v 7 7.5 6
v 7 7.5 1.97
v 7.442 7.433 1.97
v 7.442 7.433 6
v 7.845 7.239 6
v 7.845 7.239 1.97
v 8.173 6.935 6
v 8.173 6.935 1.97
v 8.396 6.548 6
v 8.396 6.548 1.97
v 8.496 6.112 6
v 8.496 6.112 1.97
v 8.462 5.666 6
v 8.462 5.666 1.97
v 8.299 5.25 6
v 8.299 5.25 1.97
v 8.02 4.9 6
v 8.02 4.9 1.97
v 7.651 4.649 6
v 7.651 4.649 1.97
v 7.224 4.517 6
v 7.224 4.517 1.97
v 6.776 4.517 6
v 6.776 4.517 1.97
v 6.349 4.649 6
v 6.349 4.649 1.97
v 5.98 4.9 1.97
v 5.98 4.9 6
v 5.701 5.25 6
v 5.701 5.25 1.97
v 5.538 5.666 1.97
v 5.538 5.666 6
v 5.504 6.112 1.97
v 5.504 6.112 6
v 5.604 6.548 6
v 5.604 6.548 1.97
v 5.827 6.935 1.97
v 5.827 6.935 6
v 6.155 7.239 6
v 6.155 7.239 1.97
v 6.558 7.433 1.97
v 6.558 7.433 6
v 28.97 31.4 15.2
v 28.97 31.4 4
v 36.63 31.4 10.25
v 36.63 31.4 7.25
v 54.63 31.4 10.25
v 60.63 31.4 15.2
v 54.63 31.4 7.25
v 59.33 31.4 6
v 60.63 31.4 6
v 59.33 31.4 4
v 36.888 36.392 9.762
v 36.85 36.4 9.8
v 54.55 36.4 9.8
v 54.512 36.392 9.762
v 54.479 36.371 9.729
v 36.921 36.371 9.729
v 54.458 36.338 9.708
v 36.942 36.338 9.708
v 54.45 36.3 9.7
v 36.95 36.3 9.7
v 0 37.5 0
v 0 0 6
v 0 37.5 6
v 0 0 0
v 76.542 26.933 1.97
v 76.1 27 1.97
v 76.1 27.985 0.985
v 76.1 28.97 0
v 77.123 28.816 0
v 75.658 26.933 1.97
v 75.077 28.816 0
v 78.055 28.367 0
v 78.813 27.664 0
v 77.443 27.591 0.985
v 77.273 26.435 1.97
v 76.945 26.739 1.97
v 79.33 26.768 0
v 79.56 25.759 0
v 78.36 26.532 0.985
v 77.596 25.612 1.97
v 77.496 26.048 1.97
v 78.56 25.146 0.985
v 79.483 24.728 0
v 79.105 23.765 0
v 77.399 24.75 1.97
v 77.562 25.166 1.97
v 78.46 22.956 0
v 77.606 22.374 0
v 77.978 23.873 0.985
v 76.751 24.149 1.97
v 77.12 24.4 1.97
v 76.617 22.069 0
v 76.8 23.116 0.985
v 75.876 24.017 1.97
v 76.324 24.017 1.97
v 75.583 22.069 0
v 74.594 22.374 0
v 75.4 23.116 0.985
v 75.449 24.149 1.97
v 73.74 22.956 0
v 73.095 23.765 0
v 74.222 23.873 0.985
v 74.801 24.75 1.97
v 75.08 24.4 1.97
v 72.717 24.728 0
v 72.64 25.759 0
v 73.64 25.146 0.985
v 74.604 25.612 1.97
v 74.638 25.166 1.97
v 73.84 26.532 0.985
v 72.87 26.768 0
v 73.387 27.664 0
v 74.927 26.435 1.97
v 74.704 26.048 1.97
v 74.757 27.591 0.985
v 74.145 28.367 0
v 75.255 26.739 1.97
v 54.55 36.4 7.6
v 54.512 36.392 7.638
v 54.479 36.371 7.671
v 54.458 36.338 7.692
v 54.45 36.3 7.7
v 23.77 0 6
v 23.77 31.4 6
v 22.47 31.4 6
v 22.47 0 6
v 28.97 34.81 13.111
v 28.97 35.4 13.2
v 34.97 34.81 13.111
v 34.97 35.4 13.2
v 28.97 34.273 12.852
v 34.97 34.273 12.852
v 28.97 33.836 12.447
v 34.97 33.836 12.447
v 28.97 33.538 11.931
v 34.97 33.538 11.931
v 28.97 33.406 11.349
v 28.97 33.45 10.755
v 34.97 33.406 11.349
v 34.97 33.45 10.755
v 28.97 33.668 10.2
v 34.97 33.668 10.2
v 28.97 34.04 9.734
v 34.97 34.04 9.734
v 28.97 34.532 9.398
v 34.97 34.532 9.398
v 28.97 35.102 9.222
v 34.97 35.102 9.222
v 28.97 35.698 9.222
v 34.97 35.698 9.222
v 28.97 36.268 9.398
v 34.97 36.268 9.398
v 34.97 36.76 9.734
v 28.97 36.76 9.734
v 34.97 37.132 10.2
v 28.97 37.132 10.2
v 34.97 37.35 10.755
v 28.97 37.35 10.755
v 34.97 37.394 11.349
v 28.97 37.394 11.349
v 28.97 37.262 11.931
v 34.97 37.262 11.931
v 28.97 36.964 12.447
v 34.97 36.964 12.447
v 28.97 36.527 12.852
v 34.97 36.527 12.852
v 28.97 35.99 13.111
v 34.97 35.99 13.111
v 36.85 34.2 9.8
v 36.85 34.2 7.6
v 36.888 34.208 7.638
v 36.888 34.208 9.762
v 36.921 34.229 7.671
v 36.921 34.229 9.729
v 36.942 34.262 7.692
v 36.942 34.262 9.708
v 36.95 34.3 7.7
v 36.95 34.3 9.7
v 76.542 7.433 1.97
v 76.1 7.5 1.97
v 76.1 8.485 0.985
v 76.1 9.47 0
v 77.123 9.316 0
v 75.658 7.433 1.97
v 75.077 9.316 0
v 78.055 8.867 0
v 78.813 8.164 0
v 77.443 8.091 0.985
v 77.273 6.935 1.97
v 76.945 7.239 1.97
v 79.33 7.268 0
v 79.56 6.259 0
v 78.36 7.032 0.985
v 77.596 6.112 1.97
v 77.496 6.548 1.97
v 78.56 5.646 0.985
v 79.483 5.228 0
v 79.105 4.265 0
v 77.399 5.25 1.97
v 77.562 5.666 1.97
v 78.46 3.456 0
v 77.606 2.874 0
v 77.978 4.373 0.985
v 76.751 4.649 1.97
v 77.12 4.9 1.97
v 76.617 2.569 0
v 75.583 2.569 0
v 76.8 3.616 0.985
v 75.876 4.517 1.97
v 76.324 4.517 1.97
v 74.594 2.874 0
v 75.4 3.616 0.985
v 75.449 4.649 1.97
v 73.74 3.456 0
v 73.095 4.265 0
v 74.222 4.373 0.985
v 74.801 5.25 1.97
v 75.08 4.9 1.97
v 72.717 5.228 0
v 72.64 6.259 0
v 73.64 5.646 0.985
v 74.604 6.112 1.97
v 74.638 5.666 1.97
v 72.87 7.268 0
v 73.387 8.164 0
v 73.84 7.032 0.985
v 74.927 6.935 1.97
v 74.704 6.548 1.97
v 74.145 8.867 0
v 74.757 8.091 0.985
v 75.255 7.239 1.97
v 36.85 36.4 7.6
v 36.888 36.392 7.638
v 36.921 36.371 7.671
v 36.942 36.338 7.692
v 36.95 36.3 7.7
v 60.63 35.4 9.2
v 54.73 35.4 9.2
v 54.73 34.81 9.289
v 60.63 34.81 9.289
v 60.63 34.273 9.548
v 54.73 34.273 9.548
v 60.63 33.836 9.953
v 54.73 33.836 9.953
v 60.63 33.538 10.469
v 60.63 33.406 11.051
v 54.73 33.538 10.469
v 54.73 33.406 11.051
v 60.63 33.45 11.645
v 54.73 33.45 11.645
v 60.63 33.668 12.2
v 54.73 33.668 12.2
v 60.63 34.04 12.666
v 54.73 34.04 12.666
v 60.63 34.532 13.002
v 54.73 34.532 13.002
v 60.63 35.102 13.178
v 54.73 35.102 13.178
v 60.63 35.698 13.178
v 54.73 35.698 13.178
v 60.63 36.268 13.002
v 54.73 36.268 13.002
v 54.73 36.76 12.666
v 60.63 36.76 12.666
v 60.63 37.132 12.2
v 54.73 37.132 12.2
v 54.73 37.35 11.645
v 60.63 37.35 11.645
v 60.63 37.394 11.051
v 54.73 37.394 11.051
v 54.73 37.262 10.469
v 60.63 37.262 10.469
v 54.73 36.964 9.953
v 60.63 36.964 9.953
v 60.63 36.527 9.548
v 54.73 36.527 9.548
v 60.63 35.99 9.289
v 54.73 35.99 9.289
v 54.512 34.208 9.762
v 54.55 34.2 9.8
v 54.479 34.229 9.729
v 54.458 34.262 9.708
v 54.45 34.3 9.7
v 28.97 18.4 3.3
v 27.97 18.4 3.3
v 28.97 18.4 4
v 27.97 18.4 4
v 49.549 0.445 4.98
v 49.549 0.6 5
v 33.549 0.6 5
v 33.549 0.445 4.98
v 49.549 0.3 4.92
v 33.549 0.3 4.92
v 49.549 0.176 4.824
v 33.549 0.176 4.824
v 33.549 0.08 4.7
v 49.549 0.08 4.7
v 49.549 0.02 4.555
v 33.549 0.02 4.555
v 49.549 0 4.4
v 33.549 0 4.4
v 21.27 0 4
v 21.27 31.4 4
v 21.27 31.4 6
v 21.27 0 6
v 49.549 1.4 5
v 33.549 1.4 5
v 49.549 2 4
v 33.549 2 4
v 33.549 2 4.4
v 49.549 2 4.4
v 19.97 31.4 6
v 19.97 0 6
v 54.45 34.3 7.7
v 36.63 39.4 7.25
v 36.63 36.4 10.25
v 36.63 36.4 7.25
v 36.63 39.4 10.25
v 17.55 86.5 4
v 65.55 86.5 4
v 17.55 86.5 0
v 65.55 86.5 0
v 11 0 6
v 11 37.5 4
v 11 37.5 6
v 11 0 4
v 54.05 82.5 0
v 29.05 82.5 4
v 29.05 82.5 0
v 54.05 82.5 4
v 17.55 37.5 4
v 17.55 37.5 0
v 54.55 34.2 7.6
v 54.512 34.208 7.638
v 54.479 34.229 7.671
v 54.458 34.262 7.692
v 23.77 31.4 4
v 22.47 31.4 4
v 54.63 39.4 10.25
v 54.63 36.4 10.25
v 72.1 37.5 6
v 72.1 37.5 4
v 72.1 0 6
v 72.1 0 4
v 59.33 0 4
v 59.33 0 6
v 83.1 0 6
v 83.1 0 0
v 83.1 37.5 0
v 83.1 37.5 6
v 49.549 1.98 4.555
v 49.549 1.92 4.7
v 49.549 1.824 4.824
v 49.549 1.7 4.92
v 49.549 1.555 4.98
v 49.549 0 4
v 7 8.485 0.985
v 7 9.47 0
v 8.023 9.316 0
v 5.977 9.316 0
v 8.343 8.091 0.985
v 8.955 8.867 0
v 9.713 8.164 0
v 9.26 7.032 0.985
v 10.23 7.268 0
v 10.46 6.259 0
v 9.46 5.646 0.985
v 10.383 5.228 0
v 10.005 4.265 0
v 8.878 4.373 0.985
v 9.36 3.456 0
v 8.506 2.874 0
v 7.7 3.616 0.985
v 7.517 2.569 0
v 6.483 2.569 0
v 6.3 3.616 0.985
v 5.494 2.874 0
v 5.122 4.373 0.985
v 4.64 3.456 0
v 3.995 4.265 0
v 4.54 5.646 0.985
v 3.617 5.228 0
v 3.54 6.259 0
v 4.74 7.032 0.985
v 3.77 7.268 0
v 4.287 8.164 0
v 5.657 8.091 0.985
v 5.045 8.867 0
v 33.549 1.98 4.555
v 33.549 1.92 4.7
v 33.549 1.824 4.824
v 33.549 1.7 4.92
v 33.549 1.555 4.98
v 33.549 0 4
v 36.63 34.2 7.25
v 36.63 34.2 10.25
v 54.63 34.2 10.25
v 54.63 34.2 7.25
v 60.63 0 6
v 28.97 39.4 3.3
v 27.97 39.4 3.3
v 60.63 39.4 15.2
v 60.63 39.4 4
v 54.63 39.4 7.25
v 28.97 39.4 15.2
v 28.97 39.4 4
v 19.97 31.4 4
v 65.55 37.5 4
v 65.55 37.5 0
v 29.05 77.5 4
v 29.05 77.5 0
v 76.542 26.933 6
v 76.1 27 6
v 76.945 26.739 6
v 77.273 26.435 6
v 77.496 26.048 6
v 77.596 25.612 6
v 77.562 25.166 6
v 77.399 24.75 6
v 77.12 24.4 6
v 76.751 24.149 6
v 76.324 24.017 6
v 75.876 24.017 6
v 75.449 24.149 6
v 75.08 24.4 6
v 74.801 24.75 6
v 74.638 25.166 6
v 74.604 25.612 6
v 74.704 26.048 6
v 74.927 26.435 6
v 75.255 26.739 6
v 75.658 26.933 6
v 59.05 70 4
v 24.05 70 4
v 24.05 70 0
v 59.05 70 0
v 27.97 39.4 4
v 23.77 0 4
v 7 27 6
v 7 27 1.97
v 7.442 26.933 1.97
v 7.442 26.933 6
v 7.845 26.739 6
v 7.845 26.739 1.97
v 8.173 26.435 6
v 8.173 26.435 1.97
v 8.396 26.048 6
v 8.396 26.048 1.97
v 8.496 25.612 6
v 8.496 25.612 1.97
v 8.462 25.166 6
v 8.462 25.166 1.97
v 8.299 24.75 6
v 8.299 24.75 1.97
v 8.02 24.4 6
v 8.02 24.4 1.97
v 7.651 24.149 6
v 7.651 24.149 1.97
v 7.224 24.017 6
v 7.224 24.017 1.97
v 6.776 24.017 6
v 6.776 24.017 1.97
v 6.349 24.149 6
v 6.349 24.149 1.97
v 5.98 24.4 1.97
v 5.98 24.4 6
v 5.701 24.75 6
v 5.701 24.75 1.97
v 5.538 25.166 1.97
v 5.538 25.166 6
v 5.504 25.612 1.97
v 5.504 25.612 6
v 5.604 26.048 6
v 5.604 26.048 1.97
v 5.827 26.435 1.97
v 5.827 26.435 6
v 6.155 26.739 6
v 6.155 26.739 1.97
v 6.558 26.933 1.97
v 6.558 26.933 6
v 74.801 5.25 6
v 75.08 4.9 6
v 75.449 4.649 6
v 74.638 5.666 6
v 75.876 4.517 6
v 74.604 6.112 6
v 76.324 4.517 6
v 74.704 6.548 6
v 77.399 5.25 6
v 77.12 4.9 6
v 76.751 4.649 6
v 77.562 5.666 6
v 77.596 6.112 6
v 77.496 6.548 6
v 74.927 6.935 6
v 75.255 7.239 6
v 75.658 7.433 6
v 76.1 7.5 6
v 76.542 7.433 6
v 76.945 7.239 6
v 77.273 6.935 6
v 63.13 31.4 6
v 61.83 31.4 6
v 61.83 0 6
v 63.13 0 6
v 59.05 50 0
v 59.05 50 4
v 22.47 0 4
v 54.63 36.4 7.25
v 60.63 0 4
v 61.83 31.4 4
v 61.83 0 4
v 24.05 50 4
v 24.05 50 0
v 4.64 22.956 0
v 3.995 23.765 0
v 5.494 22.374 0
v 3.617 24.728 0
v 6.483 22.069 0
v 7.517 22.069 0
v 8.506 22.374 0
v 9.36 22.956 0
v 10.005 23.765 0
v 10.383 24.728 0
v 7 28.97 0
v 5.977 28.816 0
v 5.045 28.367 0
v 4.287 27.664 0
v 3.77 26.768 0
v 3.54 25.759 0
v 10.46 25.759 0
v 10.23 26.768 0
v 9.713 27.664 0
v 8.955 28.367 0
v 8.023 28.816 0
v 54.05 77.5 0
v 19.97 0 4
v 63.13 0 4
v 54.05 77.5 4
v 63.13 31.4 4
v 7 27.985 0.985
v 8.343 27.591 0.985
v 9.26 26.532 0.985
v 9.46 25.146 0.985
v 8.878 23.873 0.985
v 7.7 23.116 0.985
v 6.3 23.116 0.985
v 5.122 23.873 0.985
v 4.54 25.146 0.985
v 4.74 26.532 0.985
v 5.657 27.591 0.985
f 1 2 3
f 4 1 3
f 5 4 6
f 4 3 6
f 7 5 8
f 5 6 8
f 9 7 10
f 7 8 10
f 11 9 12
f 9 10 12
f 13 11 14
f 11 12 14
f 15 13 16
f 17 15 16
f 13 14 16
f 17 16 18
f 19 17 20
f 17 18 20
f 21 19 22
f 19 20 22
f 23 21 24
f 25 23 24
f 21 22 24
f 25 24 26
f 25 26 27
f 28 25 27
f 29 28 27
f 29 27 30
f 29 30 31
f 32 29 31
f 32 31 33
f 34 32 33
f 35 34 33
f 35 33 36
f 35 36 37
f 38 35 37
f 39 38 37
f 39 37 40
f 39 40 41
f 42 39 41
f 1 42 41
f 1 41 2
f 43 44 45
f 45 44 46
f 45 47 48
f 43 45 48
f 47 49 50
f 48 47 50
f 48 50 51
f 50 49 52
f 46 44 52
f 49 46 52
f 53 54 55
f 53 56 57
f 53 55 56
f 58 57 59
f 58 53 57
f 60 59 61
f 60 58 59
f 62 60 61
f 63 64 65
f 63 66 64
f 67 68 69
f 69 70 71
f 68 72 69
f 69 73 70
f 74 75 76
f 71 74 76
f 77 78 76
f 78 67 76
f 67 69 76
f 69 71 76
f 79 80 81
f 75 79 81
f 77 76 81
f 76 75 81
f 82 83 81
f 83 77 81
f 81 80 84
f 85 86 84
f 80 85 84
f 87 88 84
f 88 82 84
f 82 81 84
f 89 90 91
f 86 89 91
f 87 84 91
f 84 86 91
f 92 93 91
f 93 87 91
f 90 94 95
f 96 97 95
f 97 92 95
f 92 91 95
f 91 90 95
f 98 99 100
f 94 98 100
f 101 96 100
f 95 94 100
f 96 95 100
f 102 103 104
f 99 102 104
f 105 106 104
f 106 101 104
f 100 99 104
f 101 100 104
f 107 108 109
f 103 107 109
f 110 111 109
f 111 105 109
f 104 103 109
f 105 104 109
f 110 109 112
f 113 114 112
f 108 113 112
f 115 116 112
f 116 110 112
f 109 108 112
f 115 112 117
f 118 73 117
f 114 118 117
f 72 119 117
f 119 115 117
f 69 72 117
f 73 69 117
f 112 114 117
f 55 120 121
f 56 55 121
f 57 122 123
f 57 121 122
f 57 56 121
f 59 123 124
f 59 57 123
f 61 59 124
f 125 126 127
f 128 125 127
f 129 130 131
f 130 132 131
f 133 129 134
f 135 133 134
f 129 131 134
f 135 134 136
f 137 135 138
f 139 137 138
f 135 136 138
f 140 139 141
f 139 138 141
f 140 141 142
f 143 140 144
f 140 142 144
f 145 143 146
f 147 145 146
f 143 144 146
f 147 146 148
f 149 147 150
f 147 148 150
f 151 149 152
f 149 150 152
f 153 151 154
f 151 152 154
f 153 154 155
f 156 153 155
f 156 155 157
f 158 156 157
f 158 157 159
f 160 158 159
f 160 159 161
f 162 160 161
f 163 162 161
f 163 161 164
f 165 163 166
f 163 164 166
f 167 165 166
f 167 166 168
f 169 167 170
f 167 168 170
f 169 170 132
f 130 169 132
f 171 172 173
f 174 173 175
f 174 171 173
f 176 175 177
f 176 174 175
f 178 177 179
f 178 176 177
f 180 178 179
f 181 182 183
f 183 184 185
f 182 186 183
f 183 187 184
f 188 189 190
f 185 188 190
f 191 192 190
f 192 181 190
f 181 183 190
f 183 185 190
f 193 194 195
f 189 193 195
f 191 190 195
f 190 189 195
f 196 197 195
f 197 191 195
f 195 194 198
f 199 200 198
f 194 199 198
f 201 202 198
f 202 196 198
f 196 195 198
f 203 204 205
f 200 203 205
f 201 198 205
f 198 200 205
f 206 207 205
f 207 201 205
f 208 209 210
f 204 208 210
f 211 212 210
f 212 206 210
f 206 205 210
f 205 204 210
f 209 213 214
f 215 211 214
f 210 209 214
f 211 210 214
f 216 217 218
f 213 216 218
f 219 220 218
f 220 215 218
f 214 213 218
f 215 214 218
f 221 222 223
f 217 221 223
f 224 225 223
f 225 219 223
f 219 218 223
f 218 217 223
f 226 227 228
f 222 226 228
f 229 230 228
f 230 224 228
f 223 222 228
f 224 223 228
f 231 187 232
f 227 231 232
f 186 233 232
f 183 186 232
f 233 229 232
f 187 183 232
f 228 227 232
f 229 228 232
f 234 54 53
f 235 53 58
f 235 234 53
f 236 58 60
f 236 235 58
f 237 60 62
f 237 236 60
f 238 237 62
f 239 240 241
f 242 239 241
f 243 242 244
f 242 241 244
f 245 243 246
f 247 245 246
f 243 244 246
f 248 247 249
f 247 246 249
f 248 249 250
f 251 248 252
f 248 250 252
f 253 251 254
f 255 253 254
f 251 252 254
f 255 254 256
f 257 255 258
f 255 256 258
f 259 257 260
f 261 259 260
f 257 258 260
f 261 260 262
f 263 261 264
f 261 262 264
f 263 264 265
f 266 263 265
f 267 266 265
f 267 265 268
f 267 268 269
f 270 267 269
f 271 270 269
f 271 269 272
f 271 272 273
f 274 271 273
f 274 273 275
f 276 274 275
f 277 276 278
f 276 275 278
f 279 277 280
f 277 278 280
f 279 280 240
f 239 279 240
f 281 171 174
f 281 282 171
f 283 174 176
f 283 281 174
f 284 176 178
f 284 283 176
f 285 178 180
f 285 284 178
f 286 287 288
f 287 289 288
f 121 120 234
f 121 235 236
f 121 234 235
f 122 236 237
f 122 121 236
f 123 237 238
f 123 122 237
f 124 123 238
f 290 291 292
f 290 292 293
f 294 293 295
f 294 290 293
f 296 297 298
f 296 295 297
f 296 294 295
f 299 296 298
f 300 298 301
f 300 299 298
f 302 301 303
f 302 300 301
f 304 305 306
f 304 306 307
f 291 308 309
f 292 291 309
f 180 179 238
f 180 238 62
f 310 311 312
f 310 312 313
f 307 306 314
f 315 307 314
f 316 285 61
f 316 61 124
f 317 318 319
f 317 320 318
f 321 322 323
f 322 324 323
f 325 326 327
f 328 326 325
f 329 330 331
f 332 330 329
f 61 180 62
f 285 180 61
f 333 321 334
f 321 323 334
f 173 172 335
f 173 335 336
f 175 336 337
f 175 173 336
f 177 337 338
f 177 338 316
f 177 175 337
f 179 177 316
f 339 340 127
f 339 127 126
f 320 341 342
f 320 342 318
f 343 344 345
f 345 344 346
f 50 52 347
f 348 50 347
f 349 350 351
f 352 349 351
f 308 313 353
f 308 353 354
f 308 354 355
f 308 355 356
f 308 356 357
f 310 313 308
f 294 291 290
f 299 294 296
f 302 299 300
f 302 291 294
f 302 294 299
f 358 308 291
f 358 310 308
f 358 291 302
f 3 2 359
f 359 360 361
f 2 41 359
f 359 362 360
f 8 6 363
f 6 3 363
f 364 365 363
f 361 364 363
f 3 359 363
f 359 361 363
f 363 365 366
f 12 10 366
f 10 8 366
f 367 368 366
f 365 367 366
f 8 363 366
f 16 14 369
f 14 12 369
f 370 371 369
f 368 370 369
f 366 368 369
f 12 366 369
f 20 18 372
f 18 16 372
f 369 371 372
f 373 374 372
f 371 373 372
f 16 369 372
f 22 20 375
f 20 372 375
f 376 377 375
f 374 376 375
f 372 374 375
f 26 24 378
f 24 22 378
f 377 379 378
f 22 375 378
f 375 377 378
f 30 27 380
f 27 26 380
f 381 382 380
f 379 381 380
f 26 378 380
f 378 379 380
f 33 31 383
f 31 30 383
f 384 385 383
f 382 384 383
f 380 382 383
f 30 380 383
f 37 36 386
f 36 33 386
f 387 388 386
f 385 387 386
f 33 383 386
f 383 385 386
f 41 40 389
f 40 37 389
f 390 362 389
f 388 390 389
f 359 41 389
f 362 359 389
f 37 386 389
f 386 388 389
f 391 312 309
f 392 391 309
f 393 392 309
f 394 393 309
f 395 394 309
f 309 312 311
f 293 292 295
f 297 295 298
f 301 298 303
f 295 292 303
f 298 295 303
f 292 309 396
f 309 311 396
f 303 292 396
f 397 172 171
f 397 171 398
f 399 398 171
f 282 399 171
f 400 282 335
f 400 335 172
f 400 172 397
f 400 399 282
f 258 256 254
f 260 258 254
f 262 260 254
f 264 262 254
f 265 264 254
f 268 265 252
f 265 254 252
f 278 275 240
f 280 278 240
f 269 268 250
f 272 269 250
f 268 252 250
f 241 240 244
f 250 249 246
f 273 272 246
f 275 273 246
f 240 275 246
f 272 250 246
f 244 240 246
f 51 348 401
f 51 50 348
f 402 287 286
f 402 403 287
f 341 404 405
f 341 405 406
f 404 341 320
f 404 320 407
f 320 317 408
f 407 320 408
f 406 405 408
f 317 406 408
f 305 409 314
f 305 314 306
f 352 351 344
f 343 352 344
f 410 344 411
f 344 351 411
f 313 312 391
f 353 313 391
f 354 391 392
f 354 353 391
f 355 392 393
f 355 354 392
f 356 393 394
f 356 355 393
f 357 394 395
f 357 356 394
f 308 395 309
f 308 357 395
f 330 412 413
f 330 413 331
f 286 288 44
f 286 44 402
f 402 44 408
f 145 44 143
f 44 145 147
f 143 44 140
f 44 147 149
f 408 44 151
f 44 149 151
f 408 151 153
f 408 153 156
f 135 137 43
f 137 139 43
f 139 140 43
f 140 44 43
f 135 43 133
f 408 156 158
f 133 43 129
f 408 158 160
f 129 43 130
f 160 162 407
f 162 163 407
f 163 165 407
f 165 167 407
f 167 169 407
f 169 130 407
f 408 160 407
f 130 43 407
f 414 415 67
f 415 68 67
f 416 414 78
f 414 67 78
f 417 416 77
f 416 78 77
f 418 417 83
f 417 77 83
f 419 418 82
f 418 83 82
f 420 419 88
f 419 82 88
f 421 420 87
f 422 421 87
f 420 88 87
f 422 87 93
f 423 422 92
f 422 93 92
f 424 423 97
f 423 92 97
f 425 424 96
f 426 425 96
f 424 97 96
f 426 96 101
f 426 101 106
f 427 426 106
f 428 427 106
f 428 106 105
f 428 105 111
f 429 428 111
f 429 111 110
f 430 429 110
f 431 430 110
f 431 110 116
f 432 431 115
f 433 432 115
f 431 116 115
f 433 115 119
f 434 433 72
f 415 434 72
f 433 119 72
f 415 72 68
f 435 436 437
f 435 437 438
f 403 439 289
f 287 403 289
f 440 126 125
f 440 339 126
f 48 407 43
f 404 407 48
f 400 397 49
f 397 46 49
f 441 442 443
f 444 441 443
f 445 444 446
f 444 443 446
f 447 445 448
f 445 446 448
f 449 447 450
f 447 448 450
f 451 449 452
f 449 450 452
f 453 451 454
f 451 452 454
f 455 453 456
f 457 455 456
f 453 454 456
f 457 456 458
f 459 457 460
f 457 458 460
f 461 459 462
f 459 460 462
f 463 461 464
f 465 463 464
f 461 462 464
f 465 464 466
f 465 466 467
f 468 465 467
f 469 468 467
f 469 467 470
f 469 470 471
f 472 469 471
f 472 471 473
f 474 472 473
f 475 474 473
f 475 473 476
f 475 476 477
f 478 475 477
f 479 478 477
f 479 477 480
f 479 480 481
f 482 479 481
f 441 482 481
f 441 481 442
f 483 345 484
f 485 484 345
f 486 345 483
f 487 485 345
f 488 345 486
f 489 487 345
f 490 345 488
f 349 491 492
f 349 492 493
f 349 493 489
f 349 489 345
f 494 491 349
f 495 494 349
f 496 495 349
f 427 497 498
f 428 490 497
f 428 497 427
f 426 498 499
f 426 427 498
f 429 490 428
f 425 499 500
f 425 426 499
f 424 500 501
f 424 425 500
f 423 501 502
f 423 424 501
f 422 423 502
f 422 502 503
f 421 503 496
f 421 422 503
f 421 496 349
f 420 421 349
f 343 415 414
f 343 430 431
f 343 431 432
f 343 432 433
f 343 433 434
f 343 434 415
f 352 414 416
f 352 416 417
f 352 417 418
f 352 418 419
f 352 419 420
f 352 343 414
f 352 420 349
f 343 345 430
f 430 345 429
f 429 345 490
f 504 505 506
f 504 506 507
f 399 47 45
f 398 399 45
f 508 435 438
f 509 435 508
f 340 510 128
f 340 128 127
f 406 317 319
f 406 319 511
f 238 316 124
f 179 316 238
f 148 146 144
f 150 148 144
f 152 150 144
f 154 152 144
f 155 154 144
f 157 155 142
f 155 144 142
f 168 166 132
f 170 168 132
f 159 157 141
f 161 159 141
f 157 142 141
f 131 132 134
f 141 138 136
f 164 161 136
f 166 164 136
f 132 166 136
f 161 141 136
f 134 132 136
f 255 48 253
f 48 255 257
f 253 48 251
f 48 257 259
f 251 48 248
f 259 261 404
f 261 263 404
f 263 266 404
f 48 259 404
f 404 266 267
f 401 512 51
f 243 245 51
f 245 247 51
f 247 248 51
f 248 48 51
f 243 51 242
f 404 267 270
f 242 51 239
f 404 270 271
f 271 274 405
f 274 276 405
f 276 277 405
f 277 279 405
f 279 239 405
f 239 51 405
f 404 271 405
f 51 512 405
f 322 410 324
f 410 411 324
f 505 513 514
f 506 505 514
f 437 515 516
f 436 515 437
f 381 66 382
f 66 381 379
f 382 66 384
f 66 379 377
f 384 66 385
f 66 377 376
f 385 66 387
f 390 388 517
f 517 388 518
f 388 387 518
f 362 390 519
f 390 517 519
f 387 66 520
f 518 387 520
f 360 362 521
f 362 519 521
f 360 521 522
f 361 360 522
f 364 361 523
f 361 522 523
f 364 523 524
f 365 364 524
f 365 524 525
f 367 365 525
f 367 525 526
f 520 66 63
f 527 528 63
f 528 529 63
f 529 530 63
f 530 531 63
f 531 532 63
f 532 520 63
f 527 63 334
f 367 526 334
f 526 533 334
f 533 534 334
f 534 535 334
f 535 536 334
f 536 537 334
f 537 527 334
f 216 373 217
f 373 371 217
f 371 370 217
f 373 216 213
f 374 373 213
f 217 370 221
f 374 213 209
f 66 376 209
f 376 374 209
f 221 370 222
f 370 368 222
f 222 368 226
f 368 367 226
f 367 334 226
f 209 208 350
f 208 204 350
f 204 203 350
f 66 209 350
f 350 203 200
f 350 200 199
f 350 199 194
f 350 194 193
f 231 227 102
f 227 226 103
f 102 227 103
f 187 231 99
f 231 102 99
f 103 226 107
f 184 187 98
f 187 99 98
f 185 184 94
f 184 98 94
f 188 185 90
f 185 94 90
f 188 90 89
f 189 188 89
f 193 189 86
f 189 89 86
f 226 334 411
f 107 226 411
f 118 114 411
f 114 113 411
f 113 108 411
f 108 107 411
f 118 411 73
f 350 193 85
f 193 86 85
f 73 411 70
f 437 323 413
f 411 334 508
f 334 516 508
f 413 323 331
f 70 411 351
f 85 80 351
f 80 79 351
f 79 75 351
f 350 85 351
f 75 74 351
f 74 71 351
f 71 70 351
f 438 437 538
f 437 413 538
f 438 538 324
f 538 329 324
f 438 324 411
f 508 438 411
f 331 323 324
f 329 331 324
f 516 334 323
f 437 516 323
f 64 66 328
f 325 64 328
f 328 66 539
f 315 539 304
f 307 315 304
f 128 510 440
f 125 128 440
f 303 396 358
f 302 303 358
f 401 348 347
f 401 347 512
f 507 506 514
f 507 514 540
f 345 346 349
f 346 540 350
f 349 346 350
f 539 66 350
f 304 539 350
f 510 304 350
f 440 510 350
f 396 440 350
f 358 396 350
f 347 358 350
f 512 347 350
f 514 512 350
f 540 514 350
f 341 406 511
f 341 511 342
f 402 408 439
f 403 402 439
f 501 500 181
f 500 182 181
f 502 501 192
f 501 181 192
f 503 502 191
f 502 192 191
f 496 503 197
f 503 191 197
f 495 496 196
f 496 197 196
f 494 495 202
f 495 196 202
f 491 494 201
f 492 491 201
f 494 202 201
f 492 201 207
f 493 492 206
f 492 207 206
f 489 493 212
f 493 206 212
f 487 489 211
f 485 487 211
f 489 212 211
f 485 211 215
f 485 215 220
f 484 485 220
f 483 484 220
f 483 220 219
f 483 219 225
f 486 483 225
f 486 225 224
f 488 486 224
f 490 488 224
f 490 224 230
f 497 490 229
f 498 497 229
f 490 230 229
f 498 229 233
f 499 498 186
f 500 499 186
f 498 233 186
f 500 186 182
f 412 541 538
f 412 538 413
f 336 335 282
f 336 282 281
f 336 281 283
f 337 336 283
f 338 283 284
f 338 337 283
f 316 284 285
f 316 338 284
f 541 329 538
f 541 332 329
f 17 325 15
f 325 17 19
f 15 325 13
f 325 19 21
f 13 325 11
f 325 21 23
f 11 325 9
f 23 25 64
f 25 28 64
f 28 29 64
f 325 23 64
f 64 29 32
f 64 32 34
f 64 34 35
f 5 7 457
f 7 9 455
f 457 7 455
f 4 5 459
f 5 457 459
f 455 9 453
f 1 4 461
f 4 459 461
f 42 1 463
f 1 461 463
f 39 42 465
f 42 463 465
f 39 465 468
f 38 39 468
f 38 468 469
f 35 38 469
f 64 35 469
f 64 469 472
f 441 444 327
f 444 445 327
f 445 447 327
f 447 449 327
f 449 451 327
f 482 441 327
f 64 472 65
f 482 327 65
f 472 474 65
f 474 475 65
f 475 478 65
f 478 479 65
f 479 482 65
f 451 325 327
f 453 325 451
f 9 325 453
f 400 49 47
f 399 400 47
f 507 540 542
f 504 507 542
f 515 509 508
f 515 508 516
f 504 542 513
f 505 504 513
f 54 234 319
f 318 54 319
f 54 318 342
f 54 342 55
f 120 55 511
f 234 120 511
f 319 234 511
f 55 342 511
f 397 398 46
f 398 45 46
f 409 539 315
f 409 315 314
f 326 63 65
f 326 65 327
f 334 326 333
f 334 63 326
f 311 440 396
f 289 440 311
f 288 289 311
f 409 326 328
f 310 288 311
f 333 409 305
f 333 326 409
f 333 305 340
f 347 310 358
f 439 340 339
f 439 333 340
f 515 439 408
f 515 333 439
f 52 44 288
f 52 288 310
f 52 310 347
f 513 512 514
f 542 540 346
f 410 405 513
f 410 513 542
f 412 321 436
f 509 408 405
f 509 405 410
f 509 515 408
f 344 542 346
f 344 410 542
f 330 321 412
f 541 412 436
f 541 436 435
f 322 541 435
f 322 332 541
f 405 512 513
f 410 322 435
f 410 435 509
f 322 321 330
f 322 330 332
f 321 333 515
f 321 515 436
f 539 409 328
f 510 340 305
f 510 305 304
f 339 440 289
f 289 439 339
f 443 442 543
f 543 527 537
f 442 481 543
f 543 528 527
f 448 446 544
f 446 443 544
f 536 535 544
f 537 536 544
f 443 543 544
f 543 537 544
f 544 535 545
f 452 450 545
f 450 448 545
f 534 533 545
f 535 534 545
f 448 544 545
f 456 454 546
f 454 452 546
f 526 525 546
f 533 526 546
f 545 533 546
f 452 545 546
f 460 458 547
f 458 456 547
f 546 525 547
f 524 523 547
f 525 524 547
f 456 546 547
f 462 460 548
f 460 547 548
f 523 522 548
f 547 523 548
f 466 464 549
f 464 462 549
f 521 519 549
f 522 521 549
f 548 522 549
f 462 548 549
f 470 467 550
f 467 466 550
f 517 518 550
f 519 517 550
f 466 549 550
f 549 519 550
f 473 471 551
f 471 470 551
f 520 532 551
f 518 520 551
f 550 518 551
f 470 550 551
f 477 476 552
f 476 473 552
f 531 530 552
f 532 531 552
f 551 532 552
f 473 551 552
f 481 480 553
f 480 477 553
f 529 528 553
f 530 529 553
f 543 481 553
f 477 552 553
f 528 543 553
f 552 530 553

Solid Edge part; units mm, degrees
sketch "Sketch1" plane through (0, 0, 0) normal (0, 0, 1) x (1, 0, 0)
  line L0 (83.1, 37.5) -> (65.55, 37.5)
  line L1 (65.55, 37.5) -> (65.55, 86.5)
  line L2 (65.55, 86.5) -> (17.55, 86.5)
  line L3 (17.55, 86.5) -> (17.55, 37.5)
  line L4 (0, 37.5) -> (17.55, 37.5)
  line L5 (0, 0) -> (0, 37.5)
  line L6 (0, 0) -> (83.1, 0)
  line L7 (83.1, 0) -> (83.1, 37.5)
extrude "Protrusion1" add sketch "Sketch1" along normal blind 4
sketch "Sketch2" plane through (40.5, 43.25, 4) normal (0, 0, 1) x (1, 0, 0)
  line L0 (-29.5, -5.75) -> (-29.5, -43.25)
  line L1 (-29.5, -43.25) -> (-40.5, -43.25)
  line L2 (-40.5, -43.25) -> (-40.5, -5.75)
  line L3 (-40.5, -5.75) -> (-29.5, -5.75)
  line L4 (-20.53, -43.25) -> (-20.53, -11.85)
  line L5 (-20.53, -11.85) -> (-19.23, -11.85)
  line L6 (-19.23, -11.85) -> (-19.23, -43.25)
  line L7 (-19.23, -43.25) -> (-20.53, -43.25)
  line L8 (-16.73, -11.85) -> (-16.73, -43.25)
  line L9 (-16.73, -43.25) -> (-18.03, -43.25)
  line L10 (-18.03, -43.25) -> (-18.03, -11.85)
  line L11 (-18.03, -11.85) -> (-16.73, -11.85)
  line L12 (18.83, -11.85) -> (18.83, -43.25)
  line L13 (18.83, -43.25) -> (20.13, -43.25)
  line L14 (20.13, -43.25) -> (20.13, -11.85)
  line L15 (20.13, -11.85) -> (18.83, -11.85)
  line L16 (22.63, -43.25) -> (22.63, -11.85)
  line L17 (22.63, -11.85) -> (21.33, -11.85)
  line L18 (21.33, -11.85) -> (21.33, -43.25)
  line L19 (21.33, -43.25) -> (22.63, -43.25)
  line L20 (31.6, -5.75) -> (31.6, -43.25)
  line L21 (31.6, -43.25) -> (42.6, -43.25)
  line L22 (42.6, -43.25) -> (42.6, -5.75)
  line L23 (42.6, -5.75) -> (31.6, -5.75)
extrude "ExtrudedProtrusion_2" add sketch "Sketch2" along normal blind 2
sketch "Sketch3" plane through (41.55, 43.25, 4) normal (0, 0, 1) x (1, 0, 0)
  line L0 (-12.58, -11.85) -> (19.08, -11.85)
  line L1 (19.08, -11.85) -> (19.08, -3.85)
  line L2 (19.08, -3.85) -> (-12.58, -3.85)
  line L3 (-12.58, -11.85) -> (-12.58, -3.85)
extrude "ExtrudedProtrusion_3" add sketch "Sketch3" along normal blind 11.2
hole "Hole_1" at (60.63, 35.4, 11.2) direction (-1, 0, 0) diameter 4 depth 5.9
sketch "Sketch4" plane through (41.55, 43.25, 4) normal (0, 0, 1) x (1, 0, 0)
  line L0 (12.5, 34.25) -> (-12.5, 34.25)
  line L1 (-12.5, 34.25) -> (-12.5, 39.25)
  line L2 (-12.5, 39.25) -> (12.5, 39.25)
  line L3 (12.5, 39.25) -> (12.5, 34.25)
  line L4 (-17.5, 26.75) -> (17.5, 26.75)
  line L5 (17.5, 26.75) -> (17.5, 6.75)
  line L6 (17.5, 6.75) -> (-17.5, 6.75)
  line L7 (-17.5, 6.75) -> (-17.5, 26.75)
extrude "Cutout1" cut sketch "Sketch4" against normal through all
hole "Hole_3" at (7, 6, 0) direction (0, 0, 1) diameter 3 end through all countersink diameter 6.94 countersink angle 90
hole "Hole1" at (7, 25.5, 0) direction (0, 0, 1) diameter 3 end through all countersink diameter 6.94 countersink angle 90
hole "Hole2" at (76.1, 6, 0) direction (0, 0, 1) diameter 3 end through all countersink diameter 6.94 countersink angle 90
hole "Hole3" at (76.1, 25.5, 0) direction (0, 0, 1) diameter 3 end through all countersink diameter 6.94 countersink angle 90
sketch "Sketch5" plane through (41.55, 15.7, 4) normal (0, 0, 1) x (1, 0, 0)
  line L0 (-8.0007, -13.7) -> (7.9993, -13.7)
  line L1 (7.9993, -13.7) -> (7.9993, -15.7)
  line L2 (-8.0007, -15.7) -> (7.9993, -15.7)
  line L3 (-8.0007, -13.7) -> (-8.0007, -15.7)
extrude "ExtrudedProtrusion_4" add sketch "Sketch5" along normal blind 1
fillet "Round_1" radius 0.6 2 edges at (41.5493, 2, 5) (41.5493, 0, 5)
sketch "Sketch6" plane through (41.55, 31.4, 9.6) normal (0, -1, 0) x (1, 0, 0)
  line L0 (-4.92, 0.65) -> (-4.92, -2.35)
  line L1 (-4.92, -2.35) -> (13.08, -2.35)
  line L2 (13.08, -2.35) -> (13.08, 0.65)
  line L3 (13.08, 0.65) -> (-4.92, 0.65)
extrude "ExtrudedCutout_2" cut sketch "Sketch6" against normal blind 2.8
sketch "Sketch7" plane through (41.55, 39.4, 9.6) normal (0, 1, 0) x (-1, 0, 0)
  line L0 (-13.08, 0.65) -> (4.92, 0.65)
  line L1 (4.92, 0.65) -> (4.92, -2.35)
  line L2 (4.92, -2.35) -> (-13.08, -2.35)
  line L3 (-13.08, -2.35) -> (-13.08, 0.65)
extrude "ExtrudedCutout_5" cut sketch "Sketch7" against normal blind 3
sketch "Sketch8" plane through (39.36, 34.2, 9.93) normal (0, -1, 0) x (1, 0, 0)
  line L0 (-2.41, -0.23) -> (15.09, -0.23)
  line L1 (15.09, -0.23) -> (15.09, -2.23)
  line L2 (15.09, -2.23) -> (-2.41, -2.23)
  line L3 (-2.41, -2.23) -> (-2.41, -0.23)
extrude "Cutout2" cut sketch "Sketch8" against normal up to next
sketch "Sketch9" plane through (40.5, 43.25, 4) normal (0, 0, 1) x (1, 0, 0)
  line L0 (-11.53, -24.85) -> (-11.53, -11.85)
  line L1 (-11.53, -11.85) -> (-12.53, -11.85)
  line L2 (-12.53, -11.85) -> (-12.53, -24.85)
  line L3 (-12.53, -24.85) -> (-11.53, -24.85)
extrude "ExtrudedCutout_7" cut sketch "Sketch9" against normal blind 0.7
sketch "Sketch10" plane through (41.55, 35.4, 15.2) normal (0, 0, 1) x (1, 0, 0)
  line L0 (-13.58, 4) -> (-13.58, -4)
  line L1 (-13.58, -4) -> (-12.58, -4)
  line L2 (-12.58, -4) -> (-12.58, 4)
  line L3 (-12.58, 4) -> (-13.58, 4)
extrude "ExtrudedCutout_8" cut sketch "Sketch10" against normal blind 11.9
fillet "Round_2" radius 0.1 1 edges at (36.95, 34.2, 8.7)
fillet "Round_3" radius 0.1 7 edges at (54.45, 36.4, 8.7) (36.95, 36.4, 8.7) (45.7, 36.4, 7.7) (45.7, 36.4, 9.7) (45.65, 34.2, 7.7) (54.45, 34.2, 8.7) (45.65, 34.2, 9.7)
hole "Hole_7" at (28.97, 35.4, 11.2) direction (1, 0, 0) diameter 4 depth 6
